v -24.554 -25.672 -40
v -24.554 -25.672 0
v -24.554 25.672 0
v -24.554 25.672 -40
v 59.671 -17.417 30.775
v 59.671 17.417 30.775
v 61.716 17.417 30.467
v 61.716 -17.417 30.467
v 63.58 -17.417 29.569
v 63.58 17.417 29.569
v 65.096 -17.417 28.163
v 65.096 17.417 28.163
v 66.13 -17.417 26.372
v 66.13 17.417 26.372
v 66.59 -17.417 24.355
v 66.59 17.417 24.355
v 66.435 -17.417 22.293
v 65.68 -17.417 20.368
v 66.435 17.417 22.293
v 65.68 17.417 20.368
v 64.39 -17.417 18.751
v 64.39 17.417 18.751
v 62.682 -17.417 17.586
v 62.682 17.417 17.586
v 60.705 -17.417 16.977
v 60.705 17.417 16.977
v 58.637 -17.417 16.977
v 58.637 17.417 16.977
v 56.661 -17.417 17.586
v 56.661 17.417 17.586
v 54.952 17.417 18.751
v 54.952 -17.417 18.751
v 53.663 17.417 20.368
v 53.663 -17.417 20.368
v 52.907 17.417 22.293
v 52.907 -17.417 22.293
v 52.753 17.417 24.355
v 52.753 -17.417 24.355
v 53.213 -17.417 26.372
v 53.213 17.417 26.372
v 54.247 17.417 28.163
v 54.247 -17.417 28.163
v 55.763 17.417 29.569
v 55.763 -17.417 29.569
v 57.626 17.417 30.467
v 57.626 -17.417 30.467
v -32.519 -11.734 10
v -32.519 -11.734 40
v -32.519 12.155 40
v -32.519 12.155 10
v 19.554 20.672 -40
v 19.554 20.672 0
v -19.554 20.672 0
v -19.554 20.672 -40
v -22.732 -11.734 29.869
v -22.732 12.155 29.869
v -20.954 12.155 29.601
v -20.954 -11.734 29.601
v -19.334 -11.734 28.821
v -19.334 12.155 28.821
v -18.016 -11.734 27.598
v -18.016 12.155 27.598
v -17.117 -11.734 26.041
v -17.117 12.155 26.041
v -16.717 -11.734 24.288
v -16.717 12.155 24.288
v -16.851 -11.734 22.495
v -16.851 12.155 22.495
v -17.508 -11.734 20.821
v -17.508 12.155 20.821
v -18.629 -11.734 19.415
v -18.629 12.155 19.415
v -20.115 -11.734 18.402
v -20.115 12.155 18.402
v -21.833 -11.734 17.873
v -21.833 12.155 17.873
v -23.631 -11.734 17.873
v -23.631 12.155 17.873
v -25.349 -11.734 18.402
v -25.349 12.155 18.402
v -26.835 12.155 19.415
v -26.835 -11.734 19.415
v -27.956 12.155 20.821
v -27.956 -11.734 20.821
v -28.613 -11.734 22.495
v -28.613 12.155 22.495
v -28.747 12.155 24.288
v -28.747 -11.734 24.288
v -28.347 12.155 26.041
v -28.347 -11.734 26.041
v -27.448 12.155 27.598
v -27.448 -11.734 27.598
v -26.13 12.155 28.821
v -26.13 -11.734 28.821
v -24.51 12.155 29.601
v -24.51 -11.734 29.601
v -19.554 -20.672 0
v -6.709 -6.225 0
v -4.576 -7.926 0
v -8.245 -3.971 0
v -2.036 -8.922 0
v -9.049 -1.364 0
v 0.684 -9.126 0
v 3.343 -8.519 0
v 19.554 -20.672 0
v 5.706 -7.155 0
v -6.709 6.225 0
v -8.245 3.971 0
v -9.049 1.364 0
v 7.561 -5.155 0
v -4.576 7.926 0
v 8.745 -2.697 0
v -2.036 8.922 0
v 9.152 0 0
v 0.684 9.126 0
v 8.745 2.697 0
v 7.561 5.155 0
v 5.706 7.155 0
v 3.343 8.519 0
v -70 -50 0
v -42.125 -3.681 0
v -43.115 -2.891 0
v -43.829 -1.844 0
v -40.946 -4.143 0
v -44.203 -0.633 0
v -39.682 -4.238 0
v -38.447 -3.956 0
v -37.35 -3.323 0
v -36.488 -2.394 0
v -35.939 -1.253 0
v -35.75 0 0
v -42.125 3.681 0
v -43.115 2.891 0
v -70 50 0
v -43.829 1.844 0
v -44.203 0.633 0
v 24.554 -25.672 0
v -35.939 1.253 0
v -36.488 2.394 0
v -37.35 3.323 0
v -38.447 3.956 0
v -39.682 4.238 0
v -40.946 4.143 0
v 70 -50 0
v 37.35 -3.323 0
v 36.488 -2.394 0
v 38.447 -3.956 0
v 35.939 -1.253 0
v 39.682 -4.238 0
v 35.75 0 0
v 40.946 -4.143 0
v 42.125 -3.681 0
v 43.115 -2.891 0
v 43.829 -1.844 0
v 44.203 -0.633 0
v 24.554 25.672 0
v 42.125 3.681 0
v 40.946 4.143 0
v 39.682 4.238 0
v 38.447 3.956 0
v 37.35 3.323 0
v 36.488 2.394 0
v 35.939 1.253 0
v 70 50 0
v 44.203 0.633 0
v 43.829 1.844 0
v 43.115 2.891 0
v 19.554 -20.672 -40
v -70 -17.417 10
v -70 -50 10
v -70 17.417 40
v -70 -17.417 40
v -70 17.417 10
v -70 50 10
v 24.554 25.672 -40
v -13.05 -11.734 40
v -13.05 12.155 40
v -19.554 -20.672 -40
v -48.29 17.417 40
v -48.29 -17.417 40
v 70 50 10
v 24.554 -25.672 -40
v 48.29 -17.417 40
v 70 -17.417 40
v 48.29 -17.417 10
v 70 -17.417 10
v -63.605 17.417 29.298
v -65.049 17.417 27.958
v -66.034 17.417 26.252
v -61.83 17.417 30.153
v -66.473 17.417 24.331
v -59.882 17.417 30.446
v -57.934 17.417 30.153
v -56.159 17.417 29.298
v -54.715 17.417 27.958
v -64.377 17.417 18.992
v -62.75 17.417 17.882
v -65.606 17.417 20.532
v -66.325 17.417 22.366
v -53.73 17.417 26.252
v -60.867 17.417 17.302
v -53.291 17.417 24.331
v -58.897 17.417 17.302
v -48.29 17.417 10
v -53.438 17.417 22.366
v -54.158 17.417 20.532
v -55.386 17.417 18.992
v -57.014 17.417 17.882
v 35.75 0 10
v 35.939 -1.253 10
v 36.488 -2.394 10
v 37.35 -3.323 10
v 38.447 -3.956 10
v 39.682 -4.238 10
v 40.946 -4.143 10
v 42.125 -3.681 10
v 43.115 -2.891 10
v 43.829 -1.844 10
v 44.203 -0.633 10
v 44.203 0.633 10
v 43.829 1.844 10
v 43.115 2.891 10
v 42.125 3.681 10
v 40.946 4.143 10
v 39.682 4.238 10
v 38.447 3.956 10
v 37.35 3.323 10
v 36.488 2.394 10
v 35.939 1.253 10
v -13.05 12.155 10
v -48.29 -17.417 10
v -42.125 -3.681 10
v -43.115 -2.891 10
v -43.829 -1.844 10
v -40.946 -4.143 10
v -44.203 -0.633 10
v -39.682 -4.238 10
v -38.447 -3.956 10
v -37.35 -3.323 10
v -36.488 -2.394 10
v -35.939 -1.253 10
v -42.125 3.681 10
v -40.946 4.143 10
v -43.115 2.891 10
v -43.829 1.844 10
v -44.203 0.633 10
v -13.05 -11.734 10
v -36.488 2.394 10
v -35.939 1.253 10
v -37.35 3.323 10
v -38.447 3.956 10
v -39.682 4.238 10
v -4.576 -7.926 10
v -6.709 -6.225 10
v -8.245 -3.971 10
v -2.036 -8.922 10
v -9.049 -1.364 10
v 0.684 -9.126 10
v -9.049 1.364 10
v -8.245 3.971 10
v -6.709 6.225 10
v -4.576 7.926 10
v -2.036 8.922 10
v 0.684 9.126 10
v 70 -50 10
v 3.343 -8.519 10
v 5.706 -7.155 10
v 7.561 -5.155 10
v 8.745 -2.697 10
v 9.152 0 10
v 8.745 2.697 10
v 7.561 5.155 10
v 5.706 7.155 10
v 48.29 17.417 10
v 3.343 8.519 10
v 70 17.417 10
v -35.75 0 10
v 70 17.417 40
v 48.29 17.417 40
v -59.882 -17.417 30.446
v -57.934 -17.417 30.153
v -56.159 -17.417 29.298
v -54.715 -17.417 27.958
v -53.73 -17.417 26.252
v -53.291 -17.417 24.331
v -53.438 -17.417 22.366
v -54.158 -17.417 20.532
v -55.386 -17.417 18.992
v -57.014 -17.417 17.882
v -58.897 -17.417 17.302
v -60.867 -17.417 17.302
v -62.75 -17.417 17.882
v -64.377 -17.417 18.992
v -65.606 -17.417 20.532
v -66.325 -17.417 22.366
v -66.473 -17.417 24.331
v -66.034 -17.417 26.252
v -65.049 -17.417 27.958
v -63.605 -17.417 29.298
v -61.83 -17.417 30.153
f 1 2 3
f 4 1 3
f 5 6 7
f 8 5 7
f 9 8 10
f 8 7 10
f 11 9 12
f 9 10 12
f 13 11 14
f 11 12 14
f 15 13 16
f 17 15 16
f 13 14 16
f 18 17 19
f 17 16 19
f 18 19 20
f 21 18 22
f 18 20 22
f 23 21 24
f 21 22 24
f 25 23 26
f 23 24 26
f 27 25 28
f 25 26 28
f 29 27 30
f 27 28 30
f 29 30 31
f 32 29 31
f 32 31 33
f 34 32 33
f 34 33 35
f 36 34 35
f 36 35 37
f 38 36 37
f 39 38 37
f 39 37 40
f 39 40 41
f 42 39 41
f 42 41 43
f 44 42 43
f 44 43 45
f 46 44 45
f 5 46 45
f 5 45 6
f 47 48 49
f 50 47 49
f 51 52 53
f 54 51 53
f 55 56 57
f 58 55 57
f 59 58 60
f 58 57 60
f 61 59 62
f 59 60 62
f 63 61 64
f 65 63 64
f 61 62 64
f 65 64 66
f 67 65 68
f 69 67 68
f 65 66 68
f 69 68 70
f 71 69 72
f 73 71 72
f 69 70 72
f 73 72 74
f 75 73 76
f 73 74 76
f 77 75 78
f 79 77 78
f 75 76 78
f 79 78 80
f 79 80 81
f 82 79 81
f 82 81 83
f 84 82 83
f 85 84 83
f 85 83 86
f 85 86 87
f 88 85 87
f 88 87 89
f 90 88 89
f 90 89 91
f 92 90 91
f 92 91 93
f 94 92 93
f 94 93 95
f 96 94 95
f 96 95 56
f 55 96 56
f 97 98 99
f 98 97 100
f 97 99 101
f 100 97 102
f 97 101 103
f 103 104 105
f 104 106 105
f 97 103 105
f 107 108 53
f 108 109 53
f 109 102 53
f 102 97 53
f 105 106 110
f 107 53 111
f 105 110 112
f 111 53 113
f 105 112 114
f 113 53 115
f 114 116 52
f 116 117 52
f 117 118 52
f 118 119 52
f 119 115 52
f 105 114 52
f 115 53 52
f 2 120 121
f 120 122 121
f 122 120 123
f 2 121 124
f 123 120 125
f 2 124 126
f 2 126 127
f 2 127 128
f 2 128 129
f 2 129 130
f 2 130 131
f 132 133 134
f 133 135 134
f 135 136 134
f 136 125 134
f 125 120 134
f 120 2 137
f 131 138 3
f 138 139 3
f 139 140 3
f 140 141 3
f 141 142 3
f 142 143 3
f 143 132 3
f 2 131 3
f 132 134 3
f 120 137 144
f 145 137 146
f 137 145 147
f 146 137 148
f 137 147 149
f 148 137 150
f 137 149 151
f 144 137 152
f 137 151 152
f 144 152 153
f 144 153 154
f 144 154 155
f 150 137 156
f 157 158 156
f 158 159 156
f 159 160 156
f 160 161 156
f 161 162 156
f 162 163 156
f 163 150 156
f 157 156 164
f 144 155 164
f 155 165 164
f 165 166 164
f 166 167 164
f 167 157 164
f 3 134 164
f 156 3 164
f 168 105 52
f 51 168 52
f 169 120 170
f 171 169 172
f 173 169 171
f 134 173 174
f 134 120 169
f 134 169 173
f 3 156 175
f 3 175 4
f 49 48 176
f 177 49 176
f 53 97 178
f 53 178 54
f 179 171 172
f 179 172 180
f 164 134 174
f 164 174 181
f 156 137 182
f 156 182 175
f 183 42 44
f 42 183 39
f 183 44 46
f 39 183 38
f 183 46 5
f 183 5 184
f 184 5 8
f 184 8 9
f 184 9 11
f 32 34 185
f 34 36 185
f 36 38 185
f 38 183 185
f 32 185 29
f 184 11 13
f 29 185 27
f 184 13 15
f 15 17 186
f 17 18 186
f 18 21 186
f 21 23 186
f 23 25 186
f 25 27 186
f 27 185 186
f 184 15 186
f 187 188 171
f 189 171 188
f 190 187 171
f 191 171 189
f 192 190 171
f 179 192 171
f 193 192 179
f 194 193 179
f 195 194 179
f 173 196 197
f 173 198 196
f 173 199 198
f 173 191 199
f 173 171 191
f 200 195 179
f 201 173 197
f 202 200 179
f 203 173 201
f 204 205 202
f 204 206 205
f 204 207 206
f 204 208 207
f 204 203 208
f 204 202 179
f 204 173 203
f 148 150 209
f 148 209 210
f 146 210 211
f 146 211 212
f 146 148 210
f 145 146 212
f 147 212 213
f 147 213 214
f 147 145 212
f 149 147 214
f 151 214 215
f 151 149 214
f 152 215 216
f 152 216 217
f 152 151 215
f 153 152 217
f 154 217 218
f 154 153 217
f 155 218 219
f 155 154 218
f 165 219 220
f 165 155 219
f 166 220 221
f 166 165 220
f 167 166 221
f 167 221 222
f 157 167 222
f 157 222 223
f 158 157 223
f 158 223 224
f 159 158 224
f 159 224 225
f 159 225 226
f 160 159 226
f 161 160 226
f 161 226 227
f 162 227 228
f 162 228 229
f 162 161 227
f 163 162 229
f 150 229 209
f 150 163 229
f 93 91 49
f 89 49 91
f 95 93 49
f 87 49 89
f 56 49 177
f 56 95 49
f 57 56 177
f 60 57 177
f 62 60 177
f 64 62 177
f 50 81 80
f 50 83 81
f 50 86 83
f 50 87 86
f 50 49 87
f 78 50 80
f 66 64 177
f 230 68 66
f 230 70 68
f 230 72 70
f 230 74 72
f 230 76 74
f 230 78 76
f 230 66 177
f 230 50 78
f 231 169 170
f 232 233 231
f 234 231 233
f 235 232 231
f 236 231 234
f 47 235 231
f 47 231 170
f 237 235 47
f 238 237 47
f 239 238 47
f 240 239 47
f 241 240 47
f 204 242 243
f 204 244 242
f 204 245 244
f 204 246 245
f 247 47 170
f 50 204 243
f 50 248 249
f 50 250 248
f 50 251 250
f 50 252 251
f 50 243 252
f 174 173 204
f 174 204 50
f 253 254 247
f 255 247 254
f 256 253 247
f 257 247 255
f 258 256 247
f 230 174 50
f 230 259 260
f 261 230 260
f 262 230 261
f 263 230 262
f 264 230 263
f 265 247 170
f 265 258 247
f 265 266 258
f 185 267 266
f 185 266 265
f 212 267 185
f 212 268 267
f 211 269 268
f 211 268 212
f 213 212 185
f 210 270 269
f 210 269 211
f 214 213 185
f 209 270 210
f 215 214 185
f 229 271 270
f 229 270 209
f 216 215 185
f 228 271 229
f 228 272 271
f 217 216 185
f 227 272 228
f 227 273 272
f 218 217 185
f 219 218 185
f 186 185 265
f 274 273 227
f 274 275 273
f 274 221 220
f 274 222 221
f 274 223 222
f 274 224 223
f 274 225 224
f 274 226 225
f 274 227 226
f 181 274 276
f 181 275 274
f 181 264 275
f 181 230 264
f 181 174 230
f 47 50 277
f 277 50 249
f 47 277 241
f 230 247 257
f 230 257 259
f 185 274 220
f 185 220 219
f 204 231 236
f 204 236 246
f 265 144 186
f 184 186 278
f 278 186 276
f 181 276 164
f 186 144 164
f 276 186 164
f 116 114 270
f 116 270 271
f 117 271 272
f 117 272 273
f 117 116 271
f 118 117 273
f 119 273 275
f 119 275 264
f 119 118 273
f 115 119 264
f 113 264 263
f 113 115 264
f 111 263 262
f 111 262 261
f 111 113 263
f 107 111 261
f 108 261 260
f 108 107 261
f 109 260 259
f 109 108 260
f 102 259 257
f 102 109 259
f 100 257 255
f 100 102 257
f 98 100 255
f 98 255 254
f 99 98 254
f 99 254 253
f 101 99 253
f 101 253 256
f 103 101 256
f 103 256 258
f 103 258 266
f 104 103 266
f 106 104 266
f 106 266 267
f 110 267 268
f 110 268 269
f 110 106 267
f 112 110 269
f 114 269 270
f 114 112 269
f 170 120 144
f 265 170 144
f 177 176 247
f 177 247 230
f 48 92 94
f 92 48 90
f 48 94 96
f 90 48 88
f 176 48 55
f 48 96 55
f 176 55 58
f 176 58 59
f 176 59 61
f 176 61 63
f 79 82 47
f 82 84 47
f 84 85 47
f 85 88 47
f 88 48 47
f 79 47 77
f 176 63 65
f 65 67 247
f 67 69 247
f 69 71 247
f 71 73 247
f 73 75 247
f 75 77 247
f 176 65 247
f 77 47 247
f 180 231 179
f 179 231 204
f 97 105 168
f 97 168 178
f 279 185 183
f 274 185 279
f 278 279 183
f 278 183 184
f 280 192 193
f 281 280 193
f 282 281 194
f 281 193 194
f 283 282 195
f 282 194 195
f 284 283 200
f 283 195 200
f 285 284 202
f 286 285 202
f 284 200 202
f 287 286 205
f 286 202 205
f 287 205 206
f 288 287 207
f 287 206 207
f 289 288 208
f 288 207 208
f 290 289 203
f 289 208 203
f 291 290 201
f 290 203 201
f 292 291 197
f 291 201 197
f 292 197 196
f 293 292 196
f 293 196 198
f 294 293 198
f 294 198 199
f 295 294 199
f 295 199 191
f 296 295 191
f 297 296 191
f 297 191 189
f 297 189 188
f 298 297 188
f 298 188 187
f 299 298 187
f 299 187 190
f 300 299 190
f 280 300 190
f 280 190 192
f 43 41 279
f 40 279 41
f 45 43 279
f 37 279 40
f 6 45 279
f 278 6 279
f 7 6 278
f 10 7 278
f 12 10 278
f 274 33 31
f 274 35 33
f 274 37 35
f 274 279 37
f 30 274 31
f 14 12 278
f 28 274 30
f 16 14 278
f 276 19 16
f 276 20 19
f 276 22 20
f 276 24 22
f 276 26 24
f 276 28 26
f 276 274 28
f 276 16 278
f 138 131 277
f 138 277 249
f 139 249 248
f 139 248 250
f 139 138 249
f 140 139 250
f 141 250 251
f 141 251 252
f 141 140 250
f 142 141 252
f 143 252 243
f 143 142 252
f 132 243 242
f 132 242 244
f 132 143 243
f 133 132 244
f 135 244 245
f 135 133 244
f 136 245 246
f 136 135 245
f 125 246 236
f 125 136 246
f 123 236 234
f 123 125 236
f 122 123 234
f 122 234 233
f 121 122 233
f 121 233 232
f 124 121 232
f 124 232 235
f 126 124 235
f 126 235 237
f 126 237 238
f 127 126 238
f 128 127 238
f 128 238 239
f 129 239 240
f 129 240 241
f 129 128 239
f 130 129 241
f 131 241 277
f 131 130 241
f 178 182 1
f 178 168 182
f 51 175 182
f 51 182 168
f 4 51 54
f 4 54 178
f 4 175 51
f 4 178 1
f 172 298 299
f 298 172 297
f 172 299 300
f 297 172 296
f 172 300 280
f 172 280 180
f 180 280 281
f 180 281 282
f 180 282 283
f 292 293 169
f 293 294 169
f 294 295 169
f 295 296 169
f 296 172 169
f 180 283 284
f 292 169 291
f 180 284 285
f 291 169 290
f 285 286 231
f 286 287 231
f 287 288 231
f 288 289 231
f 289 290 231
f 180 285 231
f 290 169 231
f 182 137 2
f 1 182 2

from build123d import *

# Parameters (mm, degrees)
ESQUISSE1_W             = 140
ESQUISSE1_H             = 100
ESQUISSE1_R             = 4.25
ESQUISSE1_R_2           = 9.151639609
BOSS_EXTRU_1_DEPTH      = 10
ESQUISSE2_W             = 49.107036246
ESQUISSE2_H             = 51.344503494
ESQUISSE2_W_2           = 39.107036246
ESQUISSE2_H_2           = 41.344503494
BOSS_EXTRU_2_DEPTH      = 40
ESQUISSE3_W             = 21.709616914
ESQUISSE3_H             = 34.834623488
ESQUISSE3_W_2           = 19.469502637
ESQUISSE3_H_2           = 23.889605939
BOSS_EXTRU_3_DEPTH      = 30
ESQUISSE4_R             = 6.609240876
ESQUISSE4_R_2           = 6.031853903
ESQUISSE4_R_3           = 6.937899237
ENL_V_MAT_EXTRU_1_DEPTH = 106.095641788


with BuildPart() as part:
    # Esquisse1 → Boss.-Extru.1 (new body)
    with BuildSketch(Plane.XY):
        Rectangle(ESQUISSE1_W, ESQUISSE1_H)
        with Locations((-40, 0)):
            Circle(ESQUISSE1_R, mode=Mode.SUBTRACT)
        with Locations(Location((40, 0, 0), (0, 0, 180))):
            Circle(ESQUISSE1_R, mode=Mode.SUBTRACT)
        Circle(ESQUISSE1_R_2, mode=Mode.SUBTRACT)
    extrude(amount=BOSS_EXTRU_1_DEPTH)

    # Esquisse2 → Boss.-Extru.2 (add)
    with BuildSketch(Plane(origin=(0, 0, 0), x_dir=(-1, 0, 0), z_dir=(0, 0, -1))):
        Rectangle(ESQUISSE2_W, ESQUISSE2_H)
        Rectangle(ESQUISSE2_W_2, ESQUISSE2_H_2, mode=Mode.SUBTRACT)
    extrude(amount=BOSS_EXTRU_2_DEPTH)

    # Esquisse3 → Boss.-Extru.3 (add)
    with BuildSketch(Plane.XY.offset(10)):
        with Locations((-59.145191543, 0)):
            Rectangle(ESQUISSE3_W, ESQUISSE3_H)
        with Locations((59.145191543, 0)):
            Rectangle(ESQUISSE3_W, ESQUISSE3_H)
        with Locations((-22.784580114, 0.210481109)):
            Rectangle(ESQUISSE3_W_2, ESQUISSE3_H_2)
    extrude(amount=BOSS_EXTRU_3_DEPTH)

    # Esquisse4 → Enlèv. mat.-Extru.1 (cut, through all)
    with BuildSketch(Plane(origin=(0, 17.417311744, 0), x_dir=(1, 0, 0), z_dir=(0, 1, 0))):
        with Locations(Location((-59.881875423, -23.83698556, 0), (0, 0, 270))):
            Circle(ESQUISSE4_R)
        with Locations(Location((-22.731959739, -23.83698556, 0), (0, 0, 270))):
            Circle(ESQUISSE4_R_2)
        with Locations(Location((59.671394315, -23.83698556, 0), (0, 0, 270))):
            Circle(ESQUISSE4_R_3)
    extrude(amount=-ENL_V_MAT_EXTRU_1_DEPTH, mode=Mode.SUBTRACT)


solid = part.part
